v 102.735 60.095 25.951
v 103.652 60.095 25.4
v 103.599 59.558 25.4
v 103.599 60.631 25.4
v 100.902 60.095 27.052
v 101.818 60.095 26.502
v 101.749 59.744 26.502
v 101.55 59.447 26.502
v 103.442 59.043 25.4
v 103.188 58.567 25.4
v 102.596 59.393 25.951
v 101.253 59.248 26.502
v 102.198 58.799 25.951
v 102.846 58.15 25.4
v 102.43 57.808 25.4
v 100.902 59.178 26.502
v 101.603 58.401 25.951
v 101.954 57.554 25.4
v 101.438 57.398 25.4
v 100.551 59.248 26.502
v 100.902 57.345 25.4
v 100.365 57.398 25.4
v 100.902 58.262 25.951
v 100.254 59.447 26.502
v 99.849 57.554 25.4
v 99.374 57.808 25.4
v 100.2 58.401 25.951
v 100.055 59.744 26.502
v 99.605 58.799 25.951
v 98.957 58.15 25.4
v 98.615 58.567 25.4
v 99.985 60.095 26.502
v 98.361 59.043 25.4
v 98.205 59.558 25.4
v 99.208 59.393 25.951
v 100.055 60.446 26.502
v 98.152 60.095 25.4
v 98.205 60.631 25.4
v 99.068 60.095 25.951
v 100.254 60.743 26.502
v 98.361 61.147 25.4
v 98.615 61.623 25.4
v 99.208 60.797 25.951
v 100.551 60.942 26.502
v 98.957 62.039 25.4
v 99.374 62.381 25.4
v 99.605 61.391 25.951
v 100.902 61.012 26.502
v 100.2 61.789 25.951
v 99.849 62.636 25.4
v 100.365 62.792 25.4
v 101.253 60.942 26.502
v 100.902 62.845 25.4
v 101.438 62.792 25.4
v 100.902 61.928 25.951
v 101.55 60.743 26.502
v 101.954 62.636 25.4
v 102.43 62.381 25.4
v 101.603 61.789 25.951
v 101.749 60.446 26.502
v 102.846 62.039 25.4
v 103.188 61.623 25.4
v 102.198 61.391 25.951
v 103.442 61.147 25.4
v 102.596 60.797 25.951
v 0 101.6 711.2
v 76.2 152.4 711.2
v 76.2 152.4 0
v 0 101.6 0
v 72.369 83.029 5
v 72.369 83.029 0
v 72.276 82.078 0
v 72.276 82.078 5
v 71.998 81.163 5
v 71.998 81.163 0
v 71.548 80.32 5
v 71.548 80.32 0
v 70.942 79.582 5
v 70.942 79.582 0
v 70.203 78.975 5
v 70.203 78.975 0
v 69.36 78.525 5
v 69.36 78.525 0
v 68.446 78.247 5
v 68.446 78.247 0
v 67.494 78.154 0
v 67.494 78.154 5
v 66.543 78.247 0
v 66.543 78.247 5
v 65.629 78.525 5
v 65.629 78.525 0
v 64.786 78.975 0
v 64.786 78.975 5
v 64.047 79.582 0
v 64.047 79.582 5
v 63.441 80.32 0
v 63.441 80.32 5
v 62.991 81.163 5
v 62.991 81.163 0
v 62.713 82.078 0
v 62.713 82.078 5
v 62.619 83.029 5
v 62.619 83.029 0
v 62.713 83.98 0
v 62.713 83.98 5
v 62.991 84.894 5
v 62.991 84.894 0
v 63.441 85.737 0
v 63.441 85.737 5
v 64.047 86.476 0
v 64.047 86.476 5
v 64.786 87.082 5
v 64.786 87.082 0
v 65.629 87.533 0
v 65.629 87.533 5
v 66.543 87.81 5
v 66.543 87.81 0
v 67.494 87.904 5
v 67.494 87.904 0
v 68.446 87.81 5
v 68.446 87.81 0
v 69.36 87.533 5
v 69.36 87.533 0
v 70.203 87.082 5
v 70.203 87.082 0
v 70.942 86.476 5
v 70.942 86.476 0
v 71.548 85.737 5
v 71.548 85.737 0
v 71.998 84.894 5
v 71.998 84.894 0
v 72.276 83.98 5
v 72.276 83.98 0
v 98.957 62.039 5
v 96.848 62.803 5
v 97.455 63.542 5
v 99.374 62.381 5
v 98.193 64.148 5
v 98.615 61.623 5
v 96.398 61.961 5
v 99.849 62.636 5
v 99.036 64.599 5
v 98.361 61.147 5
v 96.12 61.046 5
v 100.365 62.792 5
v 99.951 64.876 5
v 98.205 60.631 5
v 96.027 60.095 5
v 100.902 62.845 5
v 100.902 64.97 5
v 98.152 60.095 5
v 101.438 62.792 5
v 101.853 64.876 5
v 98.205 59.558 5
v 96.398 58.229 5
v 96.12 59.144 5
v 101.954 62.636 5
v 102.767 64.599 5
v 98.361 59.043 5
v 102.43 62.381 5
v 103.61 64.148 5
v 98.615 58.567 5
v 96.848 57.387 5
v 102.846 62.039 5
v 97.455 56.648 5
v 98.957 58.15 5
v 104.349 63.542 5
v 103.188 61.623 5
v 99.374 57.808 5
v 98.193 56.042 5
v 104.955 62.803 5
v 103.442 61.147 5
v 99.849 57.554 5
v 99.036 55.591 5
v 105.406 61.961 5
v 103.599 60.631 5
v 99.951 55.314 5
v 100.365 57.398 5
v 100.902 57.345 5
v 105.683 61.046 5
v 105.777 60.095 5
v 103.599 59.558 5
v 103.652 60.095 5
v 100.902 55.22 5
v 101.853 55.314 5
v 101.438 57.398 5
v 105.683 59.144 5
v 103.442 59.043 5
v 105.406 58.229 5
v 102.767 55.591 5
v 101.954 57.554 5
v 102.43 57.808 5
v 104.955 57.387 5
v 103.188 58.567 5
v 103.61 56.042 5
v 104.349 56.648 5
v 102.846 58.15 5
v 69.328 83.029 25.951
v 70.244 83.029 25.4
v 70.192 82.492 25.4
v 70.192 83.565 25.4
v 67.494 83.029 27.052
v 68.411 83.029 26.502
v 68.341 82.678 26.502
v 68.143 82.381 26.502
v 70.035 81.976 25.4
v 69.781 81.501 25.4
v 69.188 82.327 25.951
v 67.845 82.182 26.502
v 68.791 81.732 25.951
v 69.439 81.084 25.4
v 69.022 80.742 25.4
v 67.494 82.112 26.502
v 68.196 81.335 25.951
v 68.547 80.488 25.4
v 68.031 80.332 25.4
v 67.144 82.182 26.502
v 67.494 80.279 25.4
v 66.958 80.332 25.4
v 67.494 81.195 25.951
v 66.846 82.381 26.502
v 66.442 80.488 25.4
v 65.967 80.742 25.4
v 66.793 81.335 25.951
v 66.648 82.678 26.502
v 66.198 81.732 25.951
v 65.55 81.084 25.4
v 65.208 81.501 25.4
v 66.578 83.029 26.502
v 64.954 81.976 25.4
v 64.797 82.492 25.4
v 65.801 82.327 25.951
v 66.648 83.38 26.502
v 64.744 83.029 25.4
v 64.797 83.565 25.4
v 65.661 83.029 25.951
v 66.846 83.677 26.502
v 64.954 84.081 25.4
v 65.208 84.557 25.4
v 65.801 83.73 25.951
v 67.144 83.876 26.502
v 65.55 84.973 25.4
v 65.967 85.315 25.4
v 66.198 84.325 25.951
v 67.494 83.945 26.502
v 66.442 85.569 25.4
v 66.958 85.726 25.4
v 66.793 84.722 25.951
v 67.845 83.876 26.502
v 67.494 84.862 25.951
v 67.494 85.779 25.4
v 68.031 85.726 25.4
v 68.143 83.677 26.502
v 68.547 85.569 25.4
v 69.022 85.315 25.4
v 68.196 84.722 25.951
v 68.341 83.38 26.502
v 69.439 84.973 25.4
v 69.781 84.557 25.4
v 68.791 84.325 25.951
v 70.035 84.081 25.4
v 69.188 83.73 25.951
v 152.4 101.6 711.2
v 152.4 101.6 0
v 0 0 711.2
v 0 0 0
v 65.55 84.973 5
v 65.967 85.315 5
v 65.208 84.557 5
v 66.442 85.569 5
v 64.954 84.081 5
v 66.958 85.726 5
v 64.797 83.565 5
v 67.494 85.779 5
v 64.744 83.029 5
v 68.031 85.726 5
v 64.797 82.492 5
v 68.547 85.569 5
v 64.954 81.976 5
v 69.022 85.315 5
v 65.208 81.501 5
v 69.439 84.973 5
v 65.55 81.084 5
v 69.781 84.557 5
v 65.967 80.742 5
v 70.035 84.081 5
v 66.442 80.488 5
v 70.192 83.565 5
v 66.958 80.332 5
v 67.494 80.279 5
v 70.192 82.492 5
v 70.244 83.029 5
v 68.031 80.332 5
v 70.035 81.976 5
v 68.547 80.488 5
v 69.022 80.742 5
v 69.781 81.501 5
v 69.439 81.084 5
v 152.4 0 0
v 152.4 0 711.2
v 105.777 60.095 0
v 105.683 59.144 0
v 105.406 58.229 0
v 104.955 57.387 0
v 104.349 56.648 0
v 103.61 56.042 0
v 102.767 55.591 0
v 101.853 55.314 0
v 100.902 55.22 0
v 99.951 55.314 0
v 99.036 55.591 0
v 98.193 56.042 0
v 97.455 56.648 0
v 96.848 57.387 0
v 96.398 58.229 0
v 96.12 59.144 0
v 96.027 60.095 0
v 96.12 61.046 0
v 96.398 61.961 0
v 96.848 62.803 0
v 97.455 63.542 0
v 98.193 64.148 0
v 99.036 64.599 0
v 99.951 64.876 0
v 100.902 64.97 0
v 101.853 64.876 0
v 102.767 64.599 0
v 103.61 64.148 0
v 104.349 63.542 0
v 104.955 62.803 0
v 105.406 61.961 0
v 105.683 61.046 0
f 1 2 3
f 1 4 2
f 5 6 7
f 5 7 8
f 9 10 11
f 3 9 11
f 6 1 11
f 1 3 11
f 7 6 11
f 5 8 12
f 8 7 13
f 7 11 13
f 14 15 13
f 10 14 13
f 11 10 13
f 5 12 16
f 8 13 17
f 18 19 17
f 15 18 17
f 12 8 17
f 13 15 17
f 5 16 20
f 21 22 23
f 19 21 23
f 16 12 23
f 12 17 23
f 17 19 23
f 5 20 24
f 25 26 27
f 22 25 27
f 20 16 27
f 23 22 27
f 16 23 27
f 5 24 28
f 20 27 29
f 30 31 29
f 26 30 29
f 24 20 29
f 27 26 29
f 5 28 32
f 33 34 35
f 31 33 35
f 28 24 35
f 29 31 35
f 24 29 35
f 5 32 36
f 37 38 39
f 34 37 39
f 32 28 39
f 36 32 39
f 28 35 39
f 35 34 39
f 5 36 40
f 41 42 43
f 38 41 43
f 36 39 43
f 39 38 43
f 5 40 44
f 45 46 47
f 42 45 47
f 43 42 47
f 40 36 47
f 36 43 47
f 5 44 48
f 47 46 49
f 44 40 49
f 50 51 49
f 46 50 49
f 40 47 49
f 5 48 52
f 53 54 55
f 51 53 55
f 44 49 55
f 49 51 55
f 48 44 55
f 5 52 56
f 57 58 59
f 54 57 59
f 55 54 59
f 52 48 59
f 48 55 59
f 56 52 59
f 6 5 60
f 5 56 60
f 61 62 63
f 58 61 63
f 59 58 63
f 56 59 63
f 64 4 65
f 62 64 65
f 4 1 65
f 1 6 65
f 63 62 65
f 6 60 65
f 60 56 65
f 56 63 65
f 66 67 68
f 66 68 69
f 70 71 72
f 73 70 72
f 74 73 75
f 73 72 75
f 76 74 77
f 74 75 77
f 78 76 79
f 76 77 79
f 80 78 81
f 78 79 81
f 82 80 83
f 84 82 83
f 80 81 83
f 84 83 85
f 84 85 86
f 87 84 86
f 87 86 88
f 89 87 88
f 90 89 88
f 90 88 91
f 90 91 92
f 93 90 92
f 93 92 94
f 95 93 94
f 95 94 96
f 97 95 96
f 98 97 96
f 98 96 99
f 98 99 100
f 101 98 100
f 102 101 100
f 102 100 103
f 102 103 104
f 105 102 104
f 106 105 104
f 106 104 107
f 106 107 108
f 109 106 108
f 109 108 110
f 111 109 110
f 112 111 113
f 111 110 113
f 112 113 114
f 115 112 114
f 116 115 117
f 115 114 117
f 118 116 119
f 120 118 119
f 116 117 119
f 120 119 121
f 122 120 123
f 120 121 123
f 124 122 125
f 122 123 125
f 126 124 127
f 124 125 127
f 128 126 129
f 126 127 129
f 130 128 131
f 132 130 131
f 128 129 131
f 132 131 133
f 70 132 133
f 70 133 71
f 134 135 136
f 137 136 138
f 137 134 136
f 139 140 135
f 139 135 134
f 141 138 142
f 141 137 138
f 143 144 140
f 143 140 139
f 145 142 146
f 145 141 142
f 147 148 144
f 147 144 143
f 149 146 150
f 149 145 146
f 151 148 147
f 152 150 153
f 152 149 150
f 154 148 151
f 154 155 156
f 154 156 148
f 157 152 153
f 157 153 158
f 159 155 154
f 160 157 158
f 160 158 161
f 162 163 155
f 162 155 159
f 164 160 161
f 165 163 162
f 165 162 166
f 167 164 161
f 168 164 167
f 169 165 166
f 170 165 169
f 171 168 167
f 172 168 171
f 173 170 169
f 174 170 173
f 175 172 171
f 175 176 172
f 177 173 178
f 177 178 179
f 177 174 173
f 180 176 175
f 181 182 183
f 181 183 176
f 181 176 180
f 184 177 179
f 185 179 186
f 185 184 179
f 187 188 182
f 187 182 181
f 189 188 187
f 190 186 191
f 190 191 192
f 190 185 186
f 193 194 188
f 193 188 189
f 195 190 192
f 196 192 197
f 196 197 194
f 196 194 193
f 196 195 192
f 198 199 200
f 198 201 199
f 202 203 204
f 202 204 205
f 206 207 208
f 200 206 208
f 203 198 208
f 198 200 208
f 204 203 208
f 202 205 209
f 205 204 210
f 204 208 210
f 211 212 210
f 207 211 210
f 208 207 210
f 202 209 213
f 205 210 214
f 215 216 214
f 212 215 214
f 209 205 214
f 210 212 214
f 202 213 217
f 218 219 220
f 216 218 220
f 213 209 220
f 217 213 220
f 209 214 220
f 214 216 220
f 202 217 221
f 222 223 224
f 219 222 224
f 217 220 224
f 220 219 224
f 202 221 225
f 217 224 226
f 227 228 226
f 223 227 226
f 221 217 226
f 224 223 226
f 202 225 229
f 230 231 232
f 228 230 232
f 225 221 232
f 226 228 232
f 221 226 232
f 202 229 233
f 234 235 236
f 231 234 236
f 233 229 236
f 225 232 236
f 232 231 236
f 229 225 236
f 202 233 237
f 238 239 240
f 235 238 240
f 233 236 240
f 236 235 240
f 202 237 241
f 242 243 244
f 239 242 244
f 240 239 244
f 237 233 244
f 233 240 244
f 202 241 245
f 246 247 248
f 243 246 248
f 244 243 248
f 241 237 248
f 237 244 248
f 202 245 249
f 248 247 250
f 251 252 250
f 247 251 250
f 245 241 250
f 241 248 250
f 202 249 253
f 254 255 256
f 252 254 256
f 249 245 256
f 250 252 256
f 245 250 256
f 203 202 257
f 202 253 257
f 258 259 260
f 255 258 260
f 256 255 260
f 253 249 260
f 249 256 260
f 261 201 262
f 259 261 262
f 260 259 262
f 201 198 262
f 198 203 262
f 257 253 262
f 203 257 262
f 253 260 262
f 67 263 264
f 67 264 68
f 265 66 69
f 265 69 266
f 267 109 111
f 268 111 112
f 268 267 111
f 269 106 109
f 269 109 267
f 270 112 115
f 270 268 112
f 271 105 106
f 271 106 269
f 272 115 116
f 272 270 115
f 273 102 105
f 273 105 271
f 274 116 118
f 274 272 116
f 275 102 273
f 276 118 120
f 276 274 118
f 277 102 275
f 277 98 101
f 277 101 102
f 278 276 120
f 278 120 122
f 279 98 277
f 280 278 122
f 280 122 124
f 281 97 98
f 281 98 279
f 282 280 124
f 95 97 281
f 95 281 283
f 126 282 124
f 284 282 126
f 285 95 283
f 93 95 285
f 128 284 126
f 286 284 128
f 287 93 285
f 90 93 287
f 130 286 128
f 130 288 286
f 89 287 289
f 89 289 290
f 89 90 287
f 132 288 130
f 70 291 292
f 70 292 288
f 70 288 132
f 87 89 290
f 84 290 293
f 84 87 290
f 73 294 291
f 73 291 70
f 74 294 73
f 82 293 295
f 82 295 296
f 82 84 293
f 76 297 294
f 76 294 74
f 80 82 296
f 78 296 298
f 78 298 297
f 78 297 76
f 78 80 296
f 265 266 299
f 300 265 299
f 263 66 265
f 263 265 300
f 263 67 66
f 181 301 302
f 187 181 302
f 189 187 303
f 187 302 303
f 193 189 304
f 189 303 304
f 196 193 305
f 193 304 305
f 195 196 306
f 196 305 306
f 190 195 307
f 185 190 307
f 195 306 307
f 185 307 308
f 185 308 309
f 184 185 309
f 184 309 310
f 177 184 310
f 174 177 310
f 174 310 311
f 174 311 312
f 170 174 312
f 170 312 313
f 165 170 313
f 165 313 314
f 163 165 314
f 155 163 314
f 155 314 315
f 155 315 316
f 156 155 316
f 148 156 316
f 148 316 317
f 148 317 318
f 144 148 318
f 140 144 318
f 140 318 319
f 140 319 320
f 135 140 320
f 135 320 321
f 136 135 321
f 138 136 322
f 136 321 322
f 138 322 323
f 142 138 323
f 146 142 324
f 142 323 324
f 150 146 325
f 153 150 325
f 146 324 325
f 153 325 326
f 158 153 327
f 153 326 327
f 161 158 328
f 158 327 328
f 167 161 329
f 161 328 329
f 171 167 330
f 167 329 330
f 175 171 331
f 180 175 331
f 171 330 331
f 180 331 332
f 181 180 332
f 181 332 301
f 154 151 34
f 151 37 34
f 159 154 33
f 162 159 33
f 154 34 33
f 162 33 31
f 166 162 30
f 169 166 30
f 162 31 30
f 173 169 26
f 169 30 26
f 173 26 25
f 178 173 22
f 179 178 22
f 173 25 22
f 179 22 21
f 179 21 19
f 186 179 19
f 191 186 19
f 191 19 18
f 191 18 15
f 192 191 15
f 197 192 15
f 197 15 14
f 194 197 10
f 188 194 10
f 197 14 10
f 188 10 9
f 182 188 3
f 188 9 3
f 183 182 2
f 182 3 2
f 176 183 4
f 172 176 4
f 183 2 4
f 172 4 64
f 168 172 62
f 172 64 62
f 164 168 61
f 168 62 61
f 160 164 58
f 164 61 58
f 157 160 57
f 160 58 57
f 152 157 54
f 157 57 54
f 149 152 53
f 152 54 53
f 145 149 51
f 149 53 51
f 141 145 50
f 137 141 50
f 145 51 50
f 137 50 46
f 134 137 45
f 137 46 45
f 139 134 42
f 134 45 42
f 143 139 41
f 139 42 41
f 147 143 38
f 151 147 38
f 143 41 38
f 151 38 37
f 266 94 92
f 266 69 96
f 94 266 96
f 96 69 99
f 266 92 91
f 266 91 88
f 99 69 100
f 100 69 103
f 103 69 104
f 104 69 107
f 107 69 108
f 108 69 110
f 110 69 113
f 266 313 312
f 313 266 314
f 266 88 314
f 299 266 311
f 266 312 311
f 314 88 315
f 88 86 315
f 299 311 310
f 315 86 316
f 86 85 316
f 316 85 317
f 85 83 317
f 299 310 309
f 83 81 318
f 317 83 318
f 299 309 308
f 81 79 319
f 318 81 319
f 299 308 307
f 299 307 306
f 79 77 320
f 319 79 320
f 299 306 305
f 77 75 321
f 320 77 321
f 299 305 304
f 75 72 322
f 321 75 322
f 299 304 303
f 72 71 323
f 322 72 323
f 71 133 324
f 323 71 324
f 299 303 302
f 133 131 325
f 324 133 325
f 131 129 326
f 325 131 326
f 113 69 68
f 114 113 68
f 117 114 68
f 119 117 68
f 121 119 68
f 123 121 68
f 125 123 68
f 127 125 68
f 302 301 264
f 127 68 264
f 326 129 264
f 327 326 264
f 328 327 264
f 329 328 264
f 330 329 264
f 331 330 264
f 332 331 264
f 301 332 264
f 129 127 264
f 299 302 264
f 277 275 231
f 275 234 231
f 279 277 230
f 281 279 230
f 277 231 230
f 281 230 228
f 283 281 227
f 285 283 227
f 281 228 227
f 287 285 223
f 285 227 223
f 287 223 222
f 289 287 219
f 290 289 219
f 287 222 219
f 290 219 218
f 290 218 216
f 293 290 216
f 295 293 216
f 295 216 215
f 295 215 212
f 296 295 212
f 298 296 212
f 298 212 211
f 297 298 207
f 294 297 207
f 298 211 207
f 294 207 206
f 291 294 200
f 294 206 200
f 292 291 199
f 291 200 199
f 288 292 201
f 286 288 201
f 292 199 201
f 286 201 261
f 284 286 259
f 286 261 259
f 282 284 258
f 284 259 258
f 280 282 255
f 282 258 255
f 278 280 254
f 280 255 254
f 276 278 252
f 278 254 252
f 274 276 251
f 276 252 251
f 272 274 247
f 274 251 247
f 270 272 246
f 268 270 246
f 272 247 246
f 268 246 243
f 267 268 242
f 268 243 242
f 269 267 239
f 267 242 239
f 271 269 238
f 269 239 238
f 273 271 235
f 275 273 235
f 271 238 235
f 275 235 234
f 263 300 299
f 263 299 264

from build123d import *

# Parameters (mm, degrees)
F1_DEPTH       = 711.2
F3_D           = 5.5
F3_DEPTH       = 25.4
F3_CBORE_D     = 9.75
F3_CBORE_DEPTH = 5
F3_TIP         = 1.6523667023


# Not quite as in the source:
# - a feature names something its author has since deleted; it is built from what else it names


with BuildPart() as f1:
    # F0 (on Top) → F1 (new body)
    with BuildSketch(Plane.XY):
        Polygon((0, 101.6), (0, 0), (152.4, 0), (152.4, 101.6), (76.2, 152.4), align=None)
    extrude(amount=F1_DEPTH)

    # F3
    with Locations(Plane(origin=(0, 0, 0), x_dir=(1, 0, 0), z_dir=(0, 0, -1))):
        with Locations((100.9017452598, -60.0949265063), (67.4944594502, -83.0287188292)):
            CounterBoreHole(F3_D / 2, F3_CBORE_D / 2, F3_CBORE_DEPTH, depth=F3_DEPTH)
            with Locations((0, 0, -(F3_DEPTH + F3_TIP / 2))):  # 118° drill point
                Cone(0, F3_D / 2, F3_TIP, mode=Mode.SUBTRACT)


solid = f1.part
